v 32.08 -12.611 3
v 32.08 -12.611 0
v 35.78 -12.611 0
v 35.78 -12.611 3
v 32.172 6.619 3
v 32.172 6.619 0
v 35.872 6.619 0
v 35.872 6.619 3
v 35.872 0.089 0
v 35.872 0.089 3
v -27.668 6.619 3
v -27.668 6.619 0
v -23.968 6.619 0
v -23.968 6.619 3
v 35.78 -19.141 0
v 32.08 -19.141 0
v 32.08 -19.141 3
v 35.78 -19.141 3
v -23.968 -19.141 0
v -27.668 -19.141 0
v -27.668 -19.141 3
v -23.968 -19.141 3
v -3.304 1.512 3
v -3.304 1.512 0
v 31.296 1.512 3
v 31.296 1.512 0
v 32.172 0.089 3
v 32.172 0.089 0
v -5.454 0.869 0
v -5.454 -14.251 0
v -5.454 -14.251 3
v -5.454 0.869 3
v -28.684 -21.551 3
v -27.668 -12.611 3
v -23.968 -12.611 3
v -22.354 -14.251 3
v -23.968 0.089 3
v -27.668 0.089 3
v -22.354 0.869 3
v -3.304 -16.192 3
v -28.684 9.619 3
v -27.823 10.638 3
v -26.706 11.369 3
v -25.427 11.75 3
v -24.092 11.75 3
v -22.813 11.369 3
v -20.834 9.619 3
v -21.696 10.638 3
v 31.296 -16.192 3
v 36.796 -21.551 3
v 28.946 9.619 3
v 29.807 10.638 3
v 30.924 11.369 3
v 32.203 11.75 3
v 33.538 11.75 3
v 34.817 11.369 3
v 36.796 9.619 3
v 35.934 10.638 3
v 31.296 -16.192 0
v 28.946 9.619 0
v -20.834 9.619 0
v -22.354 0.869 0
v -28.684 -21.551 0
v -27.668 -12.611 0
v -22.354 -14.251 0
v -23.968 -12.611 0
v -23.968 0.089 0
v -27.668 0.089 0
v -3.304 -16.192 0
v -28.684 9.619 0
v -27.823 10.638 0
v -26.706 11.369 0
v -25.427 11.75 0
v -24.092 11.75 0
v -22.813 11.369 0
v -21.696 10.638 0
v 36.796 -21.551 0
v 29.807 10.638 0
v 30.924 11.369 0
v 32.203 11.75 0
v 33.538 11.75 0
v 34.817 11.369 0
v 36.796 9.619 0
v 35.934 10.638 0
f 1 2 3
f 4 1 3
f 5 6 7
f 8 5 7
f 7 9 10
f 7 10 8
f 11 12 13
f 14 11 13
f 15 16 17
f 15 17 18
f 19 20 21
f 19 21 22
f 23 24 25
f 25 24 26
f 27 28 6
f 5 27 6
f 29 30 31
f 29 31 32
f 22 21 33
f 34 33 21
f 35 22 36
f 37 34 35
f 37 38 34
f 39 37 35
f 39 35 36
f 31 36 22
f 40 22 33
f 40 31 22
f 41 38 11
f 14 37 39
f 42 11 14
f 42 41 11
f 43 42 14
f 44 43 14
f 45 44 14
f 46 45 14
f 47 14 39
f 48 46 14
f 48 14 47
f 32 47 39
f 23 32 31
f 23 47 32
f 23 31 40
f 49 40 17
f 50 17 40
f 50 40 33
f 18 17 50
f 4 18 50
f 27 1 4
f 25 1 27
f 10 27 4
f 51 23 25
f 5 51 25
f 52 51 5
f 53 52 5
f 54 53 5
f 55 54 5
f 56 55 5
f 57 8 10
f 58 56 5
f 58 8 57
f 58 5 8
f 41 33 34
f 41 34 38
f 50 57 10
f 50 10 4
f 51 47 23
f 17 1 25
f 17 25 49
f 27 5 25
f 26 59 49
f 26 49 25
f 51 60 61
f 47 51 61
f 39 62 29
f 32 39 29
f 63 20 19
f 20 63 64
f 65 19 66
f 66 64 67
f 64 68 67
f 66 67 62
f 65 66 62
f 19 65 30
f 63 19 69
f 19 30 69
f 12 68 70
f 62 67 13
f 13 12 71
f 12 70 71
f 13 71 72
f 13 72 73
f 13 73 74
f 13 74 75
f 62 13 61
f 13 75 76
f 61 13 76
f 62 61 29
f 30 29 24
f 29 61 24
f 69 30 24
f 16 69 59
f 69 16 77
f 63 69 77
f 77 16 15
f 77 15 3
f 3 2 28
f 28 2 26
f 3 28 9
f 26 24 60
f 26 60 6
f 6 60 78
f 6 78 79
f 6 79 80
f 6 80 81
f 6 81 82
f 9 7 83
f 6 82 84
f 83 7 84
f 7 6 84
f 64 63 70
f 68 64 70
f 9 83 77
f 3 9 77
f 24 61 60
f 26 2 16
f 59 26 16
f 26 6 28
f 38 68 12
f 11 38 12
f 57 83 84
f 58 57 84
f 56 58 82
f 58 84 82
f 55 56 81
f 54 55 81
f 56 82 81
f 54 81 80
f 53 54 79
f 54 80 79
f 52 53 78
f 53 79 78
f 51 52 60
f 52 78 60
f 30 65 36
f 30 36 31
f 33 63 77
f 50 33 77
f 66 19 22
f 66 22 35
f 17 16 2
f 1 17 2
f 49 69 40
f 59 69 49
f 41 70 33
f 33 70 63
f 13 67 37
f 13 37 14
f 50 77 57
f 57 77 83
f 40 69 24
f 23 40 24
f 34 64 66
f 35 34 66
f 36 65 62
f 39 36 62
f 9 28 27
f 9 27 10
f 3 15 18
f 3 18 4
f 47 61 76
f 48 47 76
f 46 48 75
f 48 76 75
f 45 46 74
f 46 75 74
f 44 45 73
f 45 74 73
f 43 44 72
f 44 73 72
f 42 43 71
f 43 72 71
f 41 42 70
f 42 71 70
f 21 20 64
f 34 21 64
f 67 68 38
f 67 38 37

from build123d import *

# Parameters (mm, degrees)
F0_W     = 3.7
F0_H     = 6.53
F0_W_2   = 16.9
F0_H_2   = 15.12
F0_W_3   = 34.6
F0_H_3   = 17.7038
F1_DEPTH = 3


with BuildPart() as f1:
    # F0 (on Top) → F1 (new body)
    with BuildSketch(Plane.XY):
        with BuildLine():
            Line((-28.684194, 9.618534), (-28.684194, -21.551466))
            Line((-28.684194, -21.551466), (36.795806, -21.551466))
            Line((36.795806, -21.551466), (36.795806, 9.618534))
            ThreePointArc((36.795806, 9.618534), (32.870806, 11.798534), (28.945806, 9.618534))
            Line((28.945806, 9.618534), (-20.834194, 9.618534))
            ThreePointArc((-20.834194, 9.618534), (-24.759194, 11.798534), (-28.684194, 9.618534))
        make_face()
        with Locations((-25.818194, -15.876466)):
            Rectangle(F0_W, F0_H, mode=Mode.SUBTRACT)
        with Locations((-13.904194, -6.691466)):
            Rectangle(F0_W_2, F0_H_2, mode=Mode.SUBTRACT)
        with Locations((33.929806, -15.876466)):
            Rectangle(F0_W, F0_H, mode=Mode.SUBTRACT)
        with Locations((13.995806, -7.340166)):
            Rectangle(F0_W_3, F0_H_3, mode=Mode.SUBTRACT)
        with Locations((-25.818194, 3.353534)):
            Rectangle(F0_W, F0_H, mode=Mode.SUBTRACT)
        with Locations((34.022406, 3.353534)):
            Rectangle(F0_W, F0_H, mode=Mode.SUBTRACT)
    extrude(amount=F1_DEPTH)


solid = f1.part
